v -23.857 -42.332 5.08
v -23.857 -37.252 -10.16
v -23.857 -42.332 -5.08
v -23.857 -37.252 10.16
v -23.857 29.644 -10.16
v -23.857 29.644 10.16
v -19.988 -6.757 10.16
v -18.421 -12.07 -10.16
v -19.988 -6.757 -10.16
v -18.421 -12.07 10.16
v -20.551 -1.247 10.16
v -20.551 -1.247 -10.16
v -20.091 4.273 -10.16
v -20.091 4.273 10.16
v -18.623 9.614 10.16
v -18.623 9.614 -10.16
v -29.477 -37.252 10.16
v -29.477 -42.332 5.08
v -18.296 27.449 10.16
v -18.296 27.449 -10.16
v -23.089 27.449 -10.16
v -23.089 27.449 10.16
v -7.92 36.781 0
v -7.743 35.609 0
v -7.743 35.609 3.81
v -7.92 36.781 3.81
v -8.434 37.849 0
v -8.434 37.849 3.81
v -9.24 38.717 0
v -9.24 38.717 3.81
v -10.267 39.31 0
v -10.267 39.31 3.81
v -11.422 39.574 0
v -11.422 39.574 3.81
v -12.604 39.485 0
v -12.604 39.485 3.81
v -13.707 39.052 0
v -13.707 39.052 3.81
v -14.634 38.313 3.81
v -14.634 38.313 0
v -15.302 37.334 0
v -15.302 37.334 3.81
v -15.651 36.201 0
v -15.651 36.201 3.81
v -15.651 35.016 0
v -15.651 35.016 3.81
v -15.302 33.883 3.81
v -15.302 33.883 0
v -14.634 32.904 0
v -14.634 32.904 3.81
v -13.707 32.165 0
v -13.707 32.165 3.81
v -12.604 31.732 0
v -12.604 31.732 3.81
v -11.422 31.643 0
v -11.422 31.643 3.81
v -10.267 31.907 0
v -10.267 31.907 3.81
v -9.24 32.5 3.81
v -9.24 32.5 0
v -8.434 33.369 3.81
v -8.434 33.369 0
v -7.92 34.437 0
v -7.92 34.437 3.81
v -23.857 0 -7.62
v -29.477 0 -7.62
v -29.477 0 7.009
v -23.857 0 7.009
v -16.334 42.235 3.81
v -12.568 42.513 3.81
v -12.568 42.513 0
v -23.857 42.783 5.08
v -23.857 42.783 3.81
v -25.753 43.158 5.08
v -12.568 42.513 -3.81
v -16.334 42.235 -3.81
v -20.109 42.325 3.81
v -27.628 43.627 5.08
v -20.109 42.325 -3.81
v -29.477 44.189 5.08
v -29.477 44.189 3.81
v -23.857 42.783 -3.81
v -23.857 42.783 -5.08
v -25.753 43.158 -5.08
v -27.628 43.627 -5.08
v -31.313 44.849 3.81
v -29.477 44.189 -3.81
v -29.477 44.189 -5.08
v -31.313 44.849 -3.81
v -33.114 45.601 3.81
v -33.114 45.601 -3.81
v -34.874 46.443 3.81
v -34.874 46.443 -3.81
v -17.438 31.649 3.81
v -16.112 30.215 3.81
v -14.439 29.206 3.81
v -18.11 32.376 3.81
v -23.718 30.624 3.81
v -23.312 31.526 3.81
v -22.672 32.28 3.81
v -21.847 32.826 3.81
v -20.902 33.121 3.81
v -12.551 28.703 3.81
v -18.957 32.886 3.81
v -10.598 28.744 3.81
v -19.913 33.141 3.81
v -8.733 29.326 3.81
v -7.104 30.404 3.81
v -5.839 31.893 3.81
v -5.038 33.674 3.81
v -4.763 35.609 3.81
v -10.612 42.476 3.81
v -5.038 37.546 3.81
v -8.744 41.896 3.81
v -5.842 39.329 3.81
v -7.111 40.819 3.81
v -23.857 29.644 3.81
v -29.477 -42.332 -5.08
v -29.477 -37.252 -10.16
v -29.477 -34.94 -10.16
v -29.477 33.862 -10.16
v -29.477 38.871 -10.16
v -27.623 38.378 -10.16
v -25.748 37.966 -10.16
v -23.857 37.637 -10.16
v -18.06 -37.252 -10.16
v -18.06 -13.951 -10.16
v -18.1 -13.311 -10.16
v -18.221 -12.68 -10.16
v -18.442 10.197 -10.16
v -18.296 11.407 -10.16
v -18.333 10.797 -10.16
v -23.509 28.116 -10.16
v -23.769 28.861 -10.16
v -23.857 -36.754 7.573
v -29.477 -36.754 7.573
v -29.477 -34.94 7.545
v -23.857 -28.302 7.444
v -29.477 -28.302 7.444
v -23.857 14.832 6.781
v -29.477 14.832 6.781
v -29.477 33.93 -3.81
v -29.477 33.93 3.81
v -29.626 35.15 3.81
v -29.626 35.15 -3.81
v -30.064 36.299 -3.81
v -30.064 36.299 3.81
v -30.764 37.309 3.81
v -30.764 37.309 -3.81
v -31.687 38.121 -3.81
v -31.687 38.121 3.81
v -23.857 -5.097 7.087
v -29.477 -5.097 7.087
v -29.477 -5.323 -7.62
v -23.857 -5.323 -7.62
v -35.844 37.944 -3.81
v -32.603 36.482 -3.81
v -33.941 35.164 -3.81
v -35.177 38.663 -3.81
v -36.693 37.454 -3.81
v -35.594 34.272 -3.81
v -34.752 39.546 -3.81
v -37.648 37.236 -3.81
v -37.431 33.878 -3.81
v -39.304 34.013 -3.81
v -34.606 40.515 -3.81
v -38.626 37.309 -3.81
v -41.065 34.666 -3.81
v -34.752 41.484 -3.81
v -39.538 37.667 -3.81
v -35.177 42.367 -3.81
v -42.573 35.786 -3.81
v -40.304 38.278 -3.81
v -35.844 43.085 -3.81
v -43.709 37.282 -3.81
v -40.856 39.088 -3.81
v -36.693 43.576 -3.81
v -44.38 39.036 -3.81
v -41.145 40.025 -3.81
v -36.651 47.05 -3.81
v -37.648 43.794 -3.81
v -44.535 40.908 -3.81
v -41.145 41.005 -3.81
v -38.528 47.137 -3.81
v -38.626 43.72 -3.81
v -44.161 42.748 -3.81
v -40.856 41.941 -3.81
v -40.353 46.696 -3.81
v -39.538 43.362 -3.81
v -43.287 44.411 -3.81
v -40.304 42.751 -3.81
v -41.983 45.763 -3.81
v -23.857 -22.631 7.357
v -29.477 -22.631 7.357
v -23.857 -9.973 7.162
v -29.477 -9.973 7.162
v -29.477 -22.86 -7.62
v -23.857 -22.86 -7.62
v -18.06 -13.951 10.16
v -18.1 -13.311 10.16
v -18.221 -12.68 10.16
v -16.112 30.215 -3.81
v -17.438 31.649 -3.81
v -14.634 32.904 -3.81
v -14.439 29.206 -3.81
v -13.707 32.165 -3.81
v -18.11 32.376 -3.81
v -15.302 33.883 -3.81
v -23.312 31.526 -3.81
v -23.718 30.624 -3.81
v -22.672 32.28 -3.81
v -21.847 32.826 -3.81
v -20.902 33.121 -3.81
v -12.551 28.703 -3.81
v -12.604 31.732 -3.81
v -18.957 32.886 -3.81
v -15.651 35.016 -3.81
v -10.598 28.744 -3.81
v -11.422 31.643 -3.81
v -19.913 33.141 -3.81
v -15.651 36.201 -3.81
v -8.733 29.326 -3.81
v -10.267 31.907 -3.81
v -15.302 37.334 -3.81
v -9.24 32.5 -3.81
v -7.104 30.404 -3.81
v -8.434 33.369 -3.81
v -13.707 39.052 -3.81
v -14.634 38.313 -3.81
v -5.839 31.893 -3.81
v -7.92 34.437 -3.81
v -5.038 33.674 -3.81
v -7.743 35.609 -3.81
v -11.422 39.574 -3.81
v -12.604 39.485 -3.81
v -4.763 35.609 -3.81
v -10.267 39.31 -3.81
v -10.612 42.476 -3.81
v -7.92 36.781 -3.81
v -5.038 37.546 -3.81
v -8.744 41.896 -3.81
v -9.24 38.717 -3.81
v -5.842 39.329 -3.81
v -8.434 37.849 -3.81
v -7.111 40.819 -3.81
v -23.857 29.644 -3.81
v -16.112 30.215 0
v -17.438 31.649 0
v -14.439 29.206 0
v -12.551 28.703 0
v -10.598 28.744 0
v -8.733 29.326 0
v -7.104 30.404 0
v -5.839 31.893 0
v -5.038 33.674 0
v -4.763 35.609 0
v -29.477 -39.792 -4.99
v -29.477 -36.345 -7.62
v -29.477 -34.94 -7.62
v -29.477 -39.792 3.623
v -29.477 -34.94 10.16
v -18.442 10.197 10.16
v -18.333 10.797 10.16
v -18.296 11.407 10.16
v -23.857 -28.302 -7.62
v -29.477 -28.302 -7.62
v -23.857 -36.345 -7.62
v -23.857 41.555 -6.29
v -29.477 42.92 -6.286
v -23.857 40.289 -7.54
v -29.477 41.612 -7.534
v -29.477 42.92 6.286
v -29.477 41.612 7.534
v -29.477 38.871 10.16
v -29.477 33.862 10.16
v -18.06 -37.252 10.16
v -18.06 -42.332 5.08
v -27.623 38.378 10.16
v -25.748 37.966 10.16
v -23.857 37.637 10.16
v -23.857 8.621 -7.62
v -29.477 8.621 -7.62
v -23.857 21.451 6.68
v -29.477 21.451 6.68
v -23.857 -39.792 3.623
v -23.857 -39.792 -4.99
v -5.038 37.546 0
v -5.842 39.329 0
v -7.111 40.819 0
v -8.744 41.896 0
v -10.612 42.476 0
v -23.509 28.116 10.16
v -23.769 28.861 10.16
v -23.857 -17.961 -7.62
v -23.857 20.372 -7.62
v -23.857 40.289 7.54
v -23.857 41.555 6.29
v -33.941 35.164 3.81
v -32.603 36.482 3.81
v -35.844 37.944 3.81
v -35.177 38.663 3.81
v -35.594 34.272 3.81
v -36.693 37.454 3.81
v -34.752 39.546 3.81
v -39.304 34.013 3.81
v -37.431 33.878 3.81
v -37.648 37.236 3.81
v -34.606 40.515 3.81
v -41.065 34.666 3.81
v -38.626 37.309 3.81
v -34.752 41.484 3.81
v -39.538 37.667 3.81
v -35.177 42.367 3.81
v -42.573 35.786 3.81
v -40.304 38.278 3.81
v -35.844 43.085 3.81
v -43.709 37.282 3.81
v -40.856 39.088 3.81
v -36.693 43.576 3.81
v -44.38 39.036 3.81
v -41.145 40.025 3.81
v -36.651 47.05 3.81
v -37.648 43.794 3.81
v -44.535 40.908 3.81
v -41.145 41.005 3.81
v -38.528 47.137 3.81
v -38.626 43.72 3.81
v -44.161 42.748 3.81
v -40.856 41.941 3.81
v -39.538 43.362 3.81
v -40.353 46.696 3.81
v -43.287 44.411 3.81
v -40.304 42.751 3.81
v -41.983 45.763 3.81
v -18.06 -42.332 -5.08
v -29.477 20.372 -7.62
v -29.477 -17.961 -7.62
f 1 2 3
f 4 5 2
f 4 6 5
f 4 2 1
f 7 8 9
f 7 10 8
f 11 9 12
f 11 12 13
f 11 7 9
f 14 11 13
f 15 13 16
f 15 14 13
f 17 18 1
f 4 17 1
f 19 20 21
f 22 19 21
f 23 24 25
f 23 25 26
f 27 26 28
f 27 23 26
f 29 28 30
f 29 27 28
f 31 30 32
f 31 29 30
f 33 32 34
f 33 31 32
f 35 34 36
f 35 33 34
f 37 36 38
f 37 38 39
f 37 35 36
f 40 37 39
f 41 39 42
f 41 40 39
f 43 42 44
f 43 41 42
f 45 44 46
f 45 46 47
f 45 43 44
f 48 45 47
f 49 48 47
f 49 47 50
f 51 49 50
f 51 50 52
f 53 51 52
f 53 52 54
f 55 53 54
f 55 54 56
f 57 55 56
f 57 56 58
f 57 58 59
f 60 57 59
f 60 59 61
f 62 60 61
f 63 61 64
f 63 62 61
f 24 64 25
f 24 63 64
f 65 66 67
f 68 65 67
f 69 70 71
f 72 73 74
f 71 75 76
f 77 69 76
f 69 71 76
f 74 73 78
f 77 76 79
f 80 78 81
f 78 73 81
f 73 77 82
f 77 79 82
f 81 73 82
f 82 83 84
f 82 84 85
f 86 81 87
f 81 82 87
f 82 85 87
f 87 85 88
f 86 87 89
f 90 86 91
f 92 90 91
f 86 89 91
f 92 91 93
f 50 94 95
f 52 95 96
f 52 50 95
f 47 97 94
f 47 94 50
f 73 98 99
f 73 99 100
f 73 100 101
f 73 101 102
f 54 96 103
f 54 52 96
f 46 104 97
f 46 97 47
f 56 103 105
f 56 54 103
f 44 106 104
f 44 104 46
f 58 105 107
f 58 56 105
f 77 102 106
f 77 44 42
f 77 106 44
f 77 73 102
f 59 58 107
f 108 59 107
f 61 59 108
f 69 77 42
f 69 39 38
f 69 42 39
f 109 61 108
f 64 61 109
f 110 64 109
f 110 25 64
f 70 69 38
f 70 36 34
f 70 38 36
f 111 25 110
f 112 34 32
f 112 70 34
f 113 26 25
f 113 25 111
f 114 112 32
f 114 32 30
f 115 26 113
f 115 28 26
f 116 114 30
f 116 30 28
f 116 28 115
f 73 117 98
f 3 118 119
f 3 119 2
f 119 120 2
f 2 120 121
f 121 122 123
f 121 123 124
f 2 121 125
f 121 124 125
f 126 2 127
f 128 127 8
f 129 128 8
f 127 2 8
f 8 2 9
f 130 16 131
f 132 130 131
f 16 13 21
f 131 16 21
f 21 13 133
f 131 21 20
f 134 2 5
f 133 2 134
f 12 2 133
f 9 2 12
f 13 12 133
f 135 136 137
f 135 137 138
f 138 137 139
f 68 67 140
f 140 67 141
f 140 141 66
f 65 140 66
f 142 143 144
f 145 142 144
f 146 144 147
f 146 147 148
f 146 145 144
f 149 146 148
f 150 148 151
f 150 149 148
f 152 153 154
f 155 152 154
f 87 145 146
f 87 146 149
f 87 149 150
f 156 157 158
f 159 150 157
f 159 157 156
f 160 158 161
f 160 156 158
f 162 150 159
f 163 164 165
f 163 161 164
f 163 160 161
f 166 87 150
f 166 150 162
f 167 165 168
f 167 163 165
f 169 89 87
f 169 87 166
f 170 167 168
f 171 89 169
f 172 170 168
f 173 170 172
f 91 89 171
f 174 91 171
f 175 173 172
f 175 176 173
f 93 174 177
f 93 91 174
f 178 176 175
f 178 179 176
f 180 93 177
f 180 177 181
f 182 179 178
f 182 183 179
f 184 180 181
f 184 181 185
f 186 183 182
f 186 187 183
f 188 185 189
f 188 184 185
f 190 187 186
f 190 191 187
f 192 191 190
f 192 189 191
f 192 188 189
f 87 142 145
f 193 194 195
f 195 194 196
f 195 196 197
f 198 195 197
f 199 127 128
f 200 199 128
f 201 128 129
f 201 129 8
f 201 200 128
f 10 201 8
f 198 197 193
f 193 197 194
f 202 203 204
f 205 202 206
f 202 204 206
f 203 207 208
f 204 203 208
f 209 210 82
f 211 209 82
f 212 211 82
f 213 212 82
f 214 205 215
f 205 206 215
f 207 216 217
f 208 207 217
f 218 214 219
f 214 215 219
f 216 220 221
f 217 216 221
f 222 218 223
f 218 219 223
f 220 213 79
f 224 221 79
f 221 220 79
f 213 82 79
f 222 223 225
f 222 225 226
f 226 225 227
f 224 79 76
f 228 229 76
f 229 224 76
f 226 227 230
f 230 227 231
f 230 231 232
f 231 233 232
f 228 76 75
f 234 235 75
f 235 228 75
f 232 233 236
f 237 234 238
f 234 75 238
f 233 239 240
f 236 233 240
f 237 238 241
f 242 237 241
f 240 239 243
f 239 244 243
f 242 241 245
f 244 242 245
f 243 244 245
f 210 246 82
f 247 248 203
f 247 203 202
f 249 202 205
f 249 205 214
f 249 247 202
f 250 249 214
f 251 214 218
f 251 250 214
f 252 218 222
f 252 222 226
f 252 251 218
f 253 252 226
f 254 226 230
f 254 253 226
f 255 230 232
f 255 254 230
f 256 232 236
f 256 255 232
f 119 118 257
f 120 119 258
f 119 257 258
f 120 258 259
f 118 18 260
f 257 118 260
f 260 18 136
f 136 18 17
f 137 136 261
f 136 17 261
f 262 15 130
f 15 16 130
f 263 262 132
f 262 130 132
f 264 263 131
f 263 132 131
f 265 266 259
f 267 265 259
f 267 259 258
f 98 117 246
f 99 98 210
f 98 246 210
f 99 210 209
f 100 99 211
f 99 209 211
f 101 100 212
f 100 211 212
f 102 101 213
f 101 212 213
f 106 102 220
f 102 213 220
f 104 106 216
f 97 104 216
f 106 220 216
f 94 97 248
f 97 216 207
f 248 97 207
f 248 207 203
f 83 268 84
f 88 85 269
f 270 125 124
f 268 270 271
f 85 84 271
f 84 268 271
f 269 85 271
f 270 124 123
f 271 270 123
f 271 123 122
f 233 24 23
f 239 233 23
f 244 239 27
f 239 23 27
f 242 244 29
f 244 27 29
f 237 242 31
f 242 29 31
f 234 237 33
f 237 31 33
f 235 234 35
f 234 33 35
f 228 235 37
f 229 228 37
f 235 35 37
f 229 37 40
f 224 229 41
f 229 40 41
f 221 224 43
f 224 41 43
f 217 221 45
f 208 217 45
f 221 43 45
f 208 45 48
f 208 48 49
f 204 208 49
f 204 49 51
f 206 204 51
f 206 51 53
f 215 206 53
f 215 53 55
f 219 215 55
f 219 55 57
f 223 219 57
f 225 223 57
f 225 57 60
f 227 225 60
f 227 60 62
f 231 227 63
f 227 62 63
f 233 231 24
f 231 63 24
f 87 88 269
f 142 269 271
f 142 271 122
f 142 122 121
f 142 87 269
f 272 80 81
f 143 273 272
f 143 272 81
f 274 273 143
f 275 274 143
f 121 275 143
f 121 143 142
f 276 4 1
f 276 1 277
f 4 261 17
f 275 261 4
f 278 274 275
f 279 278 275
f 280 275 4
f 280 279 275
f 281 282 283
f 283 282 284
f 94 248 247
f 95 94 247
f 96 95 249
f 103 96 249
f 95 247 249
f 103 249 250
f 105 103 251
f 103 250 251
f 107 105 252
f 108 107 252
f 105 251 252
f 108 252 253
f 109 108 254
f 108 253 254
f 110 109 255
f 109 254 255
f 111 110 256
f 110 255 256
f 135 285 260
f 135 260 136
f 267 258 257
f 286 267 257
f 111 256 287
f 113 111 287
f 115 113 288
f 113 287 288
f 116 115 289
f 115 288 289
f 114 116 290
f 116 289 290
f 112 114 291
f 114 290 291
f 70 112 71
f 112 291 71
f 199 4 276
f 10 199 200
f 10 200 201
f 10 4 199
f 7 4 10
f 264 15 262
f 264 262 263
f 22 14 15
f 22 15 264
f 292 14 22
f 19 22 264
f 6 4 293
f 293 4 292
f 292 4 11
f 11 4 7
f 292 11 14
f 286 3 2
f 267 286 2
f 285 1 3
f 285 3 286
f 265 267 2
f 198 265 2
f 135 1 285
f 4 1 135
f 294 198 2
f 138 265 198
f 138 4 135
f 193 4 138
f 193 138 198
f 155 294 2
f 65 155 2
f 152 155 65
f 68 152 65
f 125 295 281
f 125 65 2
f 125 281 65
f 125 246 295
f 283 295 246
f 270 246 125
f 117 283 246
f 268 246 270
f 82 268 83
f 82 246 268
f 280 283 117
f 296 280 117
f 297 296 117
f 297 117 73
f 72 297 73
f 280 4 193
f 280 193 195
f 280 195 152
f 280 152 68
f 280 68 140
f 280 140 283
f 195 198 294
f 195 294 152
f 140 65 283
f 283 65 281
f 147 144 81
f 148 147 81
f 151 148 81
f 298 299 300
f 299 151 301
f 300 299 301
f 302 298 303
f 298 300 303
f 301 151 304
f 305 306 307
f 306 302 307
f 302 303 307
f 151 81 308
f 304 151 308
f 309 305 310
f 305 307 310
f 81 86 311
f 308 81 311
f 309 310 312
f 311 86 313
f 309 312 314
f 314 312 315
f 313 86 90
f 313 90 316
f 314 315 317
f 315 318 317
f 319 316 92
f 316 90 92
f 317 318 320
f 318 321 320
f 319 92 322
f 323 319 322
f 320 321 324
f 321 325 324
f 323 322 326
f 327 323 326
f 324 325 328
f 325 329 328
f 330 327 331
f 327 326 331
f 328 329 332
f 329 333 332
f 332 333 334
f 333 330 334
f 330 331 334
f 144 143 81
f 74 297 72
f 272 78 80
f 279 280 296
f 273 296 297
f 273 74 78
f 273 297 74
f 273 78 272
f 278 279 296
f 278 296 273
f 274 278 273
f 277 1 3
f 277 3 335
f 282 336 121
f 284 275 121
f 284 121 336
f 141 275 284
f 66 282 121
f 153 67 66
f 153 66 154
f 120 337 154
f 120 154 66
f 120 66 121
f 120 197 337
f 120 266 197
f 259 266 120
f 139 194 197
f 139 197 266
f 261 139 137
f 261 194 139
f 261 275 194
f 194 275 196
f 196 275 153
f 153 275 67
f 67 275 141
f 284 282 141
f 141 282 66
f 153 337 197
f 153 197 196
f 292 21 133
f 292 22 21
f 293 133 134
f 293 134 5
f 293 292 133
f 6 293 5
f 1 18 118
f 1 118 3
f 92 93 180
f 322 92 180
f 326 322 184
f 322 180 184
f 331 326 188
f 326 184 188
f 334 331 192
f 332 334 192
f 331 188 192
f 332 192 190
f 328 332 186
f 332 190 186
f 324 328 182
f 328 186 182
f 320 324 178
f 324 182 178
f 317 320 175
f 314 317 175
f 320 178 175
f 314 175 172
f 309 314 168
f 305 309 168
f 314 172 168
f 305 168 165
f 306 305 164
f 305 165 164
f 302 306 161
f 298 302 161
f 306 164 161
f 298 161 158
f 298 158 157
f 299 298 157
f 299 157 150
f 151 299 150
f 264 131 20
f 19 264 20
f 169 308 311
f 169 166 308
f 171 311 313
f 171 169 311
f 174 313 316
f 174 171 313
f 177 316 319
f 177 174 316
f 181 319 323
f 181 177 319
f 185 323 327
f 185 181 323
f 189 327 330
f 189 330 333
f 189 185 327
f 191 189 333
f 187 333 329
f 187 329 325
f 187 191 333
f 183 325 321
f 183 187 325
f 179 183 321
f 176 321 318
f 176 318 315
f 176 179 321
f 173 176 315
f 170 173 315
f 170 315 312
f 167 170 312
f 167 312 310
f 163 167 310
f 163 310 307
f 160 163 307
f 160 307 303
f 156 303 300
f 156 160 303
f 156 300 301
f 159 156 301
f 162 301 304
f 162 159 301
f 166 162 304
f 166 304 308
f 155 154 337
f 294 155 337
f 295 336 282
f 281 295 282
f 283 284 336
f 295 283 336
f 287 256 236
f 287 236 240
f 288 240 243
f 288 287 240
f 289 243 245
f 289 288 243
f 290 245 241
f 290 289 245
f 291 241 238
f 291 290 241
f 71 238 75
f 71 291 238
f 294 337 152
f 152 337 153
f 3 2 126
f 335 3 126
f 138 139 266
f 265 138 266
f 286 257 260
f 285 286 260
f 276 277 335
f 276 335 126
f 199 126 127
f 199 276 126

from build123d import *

# Parameters (mm, degrees)
F0_W        = 5.6202424753
F0_H        = 7.3923990308
F1_DEPTH    = 10.16
F0_R        = 3.2880029728
F0_R_2      = 3.9763748147
F2_DEPTH    = 3.81
F3_SIZE     = 5.08
F4_DEPTH    = 10.16
F5_SIZE     = 5.08
F6_T1_DEPTH = 7.62
F6_2_F1_R   = 5.08
F6_2_F2_R   = 5.08
F8_DEPTH    = 12.7


# Not quite as in the source:
# - a fillet or chamfer that OpenCascade refuses, or shapes differently, is made with other operations: its cross-section is extruded or revolved along the edge and cut away or added


with BuildPart() as f1:
    # F0 (on Top) → F1 (new body, symmetric)
    with BuildSketch(Plane.XY):
        Polygon((-23.8571265649, 38.1211079657), (-29.4773678438, 38.1211079657), (-29.4773678438, 33.8620854561), (-29.4773689242, -34.9397621871), (-23.8571265649, -34.9397622754), (-23.8571265649, 29.6442432214), align=None)
        with BuildLine():
            ThreePointArc((-23.8571265649, 42.7830699379), (-26.6935732854, 43.3808072311), (-29.4773678438, 44.1890199055))
            Line((-29.4773678438, 44.1890199055), (-29.4773678438, 38.1211079657))
            Line((-29.4773678438, 38.1211079657), (-23.8571265649, 38.1211079657))
            Line((-23.8571265649, 38.1211079657), (-23.8571265649, 42.7830699379))
        make_face()
        with Locations((-26.6672478026, -38.6359617025)):
            Rectangle(F0_W, F0_H)
    extrude(amount=F1_DEPTH, both=True)

    # F0 (on Top) → F2 (join, symmetric)
    with BuildSketch(Plane.XY):
        with BuildLine():
            ThreePointArc((-31.6869179481, 38.1211079657), (-31.3536995737, 39.297400699), (-31.2413621678, 40.5148075278))
            ThreePointArc((-31.2413621678, 40.5148075278), (-32.2218622797, 43.9910999495), (-34.8743439371, 46.4426974955))
            ThreePointArc((-34.8743439371, 46.4426974955), (-44.1066653776, 38.1351969368), (-31.6869179481, 38.1211079657))
        make_face()
        with Locations((-37.8940842395, 40.5148075278)):
            Circle(F0_R, mode=Mode.SUBTRACT)
        with BuildLine():
            ThreePointArc((-4.763312552, 35.6086244195), (-7.1105593997, 40.8187113422), (-12.5681646531, 42.5125585623))
            ThreePointArc((-12.5681646531, 42.5125585623), (-18.0664915689, 38.4542200705), (-17.4383845866, 31.6492812901))
            ThreePointArc((-17.4383845866, 31.6492812901), (-9.6452347995, 28.9690866137), (-4.763312552, 35.6086244195))
        make_face()
        with Locations((-11.7192433987, 35.6086244195)):
            Circle(F0_R_2, mode=Mode.SUBTRACT)
        with BuildLine():
            ThreePointArc((-12.5681646531, 42.5125585623), (-18.2225576344, 42.2341662967), (-23.8571265649, 42.7830699379))
            Line((-23.8571265649, 42.7830699379), (-23.8571265649, 38.1211079657))
            Line((-23.8571265649, 38.1211079657), (-23.8571265649, 29.6442432214))
            ThreePointArc((-23.8571265649, 29.6442432214), (-21.3848882076, 33.0065499535), (-17.4383845866, 31.6492812901))
            ThreePointArc((-17.4383845866, 31.6492812901), (-18.0664915689, 38.4542200705), (-12.5681646531, 42.5125585623))
        make_face()
        with BuildLine():
            ThreePointArc((-34.8743439371, 46.4426974955), (-32.2218622797, 43.9910999495), (-31.2413621678, 40.5148075278))
            ThreePointArc((-31.2413621678, 40.5148075278), (-31.3536995737, 39.297400699), (-31.6869179481, 38.1211079657))
            Line((-31.6869179481, 38.1211079657), (-29.4773678438, 38.1211079657))
            Line((-29.4773678438, 38.1211079657), (-29.4773678438, 44.1890199055))
            ThreePointArc((-29.4773678438, 44.1890199055), (-32.2184586739, 45.213836031), (-34.8743439371, 46.4426974955))
        make_face()
    extrude(amount=F2_DEPTH, both=True)

    # F3
    f3_edges = [f1.edges().sort_by_distance(p)[0] for p in [
        (-26.693573, 43.380807, 10.16),
        (-26.693573, 43.380807, -10.16),
        (-26.667248, -42.332161, 10.16),
        (-26.667248, -42.332161, -10.16),
    ]]
    chamfer(f3_edges, length=F3_SIZE)

    # F6: fillet of radius 5.08 on 4 edges, made by hand

    # F6_s2 → F6_t1 (join)
    with BuildSketch(Plane.XY.offset(-3.81)):
        with BuildLine():
            ThreePointArc((-29.4773678427, 33.9298172252), (-30.063578473, 36.2988375878), (-31.6869179481, 38.1211079657))
            Line((-31.6869179481, 38.1211079657), (-31.3998729586, 38.5402370318))
            ThreePointArc((-31.3998729586, 38.5402370318), (-30.5821428959, 38.6291079657), (-29.4773678438, 38.6291079657))
            Line((-29.4773678438, 38.6291079657), (-28.9693678438, 38.1211079657))
            Line((-28.9693678438, 38.1211079657), (-28.9693678427, 33.9298172173))
            Line((-28.9693678427, 33.9298172173), (-29.4773678427, 33.9298172252))
        make_face()
    extrude(amount=F6_T1_DEPTH)

    # F7 (on face) → F8 (cut)
    with BuildSketch(Plane(origin=(-29.4773683755, 4.629e-07, 0), x_dir=(-1.57e-08, -1, 0), z_dir=(-1, 1.57e-08, 0))):
        Polygon((36.3451056182, -7.62), (39.7921616808, -4.9903579056), (39.7921616808, 3.623371711), (36.7539399008, 7.5733514423), (28.3016198795, 7.443575354), (28.3016198795, -7.62), align=None)
        Polygon((9.9728746732, 7.1621576072), (22.8604692966, -7.62), (22.6305215634, 7.3565018696), align=None)
        Polygon((17.961487174, -7.62), (5.0967486238, 7.0872900485), (5.3225629052, -7.62), align=None)
        Polygon((0, -7.62), (0, 7.0090350727), (-14.8322781086, 6.7813017369), align=None)
        Polygon((-21.4508656455, 6.6796805964), (-20.3723220551, -7.62), (-8.6206179077, -7.62), align=None)
    extrude(amount=-F8_DEPTH, mode=Mode.SUBTRACT)


with BuildPart() as f4:
    # F0 (on Top) → F4 (new body, symmetric)
    with BuildSketch(Plane.XY):
        with BuildLine():
            ThreePointArc((-23.0891581237, 27.4486547619), (-23.6595960638, 28.481231591), (-23.8571265649, 29.6442432214))
            Line((-23.8571265649, 29.6442432214), (-23.8571265649, -34.9397622754))
            Line((-23.8571265649, -34.9397622754), (-23.8571265649, -42.3321612179))
            Line((-23.8571265649, -42.3321612179), (-18.0597770959, -42.3321612179))
            Line((-18.0597770959, -42.3321612179), (-18.0597770959, -12.9362130538))
            ThreePointArc((-18.0597770959, -12.9362130538), (-20.5510916383, -1.2707557569), (-18.2962100953, 10.442700237))
            Line((-18.2962100953, 10.442700237), (-18.2962100953, 27.4486547619))
            Line((-18.2962100953, 27.4486547619), (-23.0891581237, 27.4486547619))
        make_face()
    extrude(amount=F4_DEPTH, both=True)

    # F5
    f5_edges = [f4.edges().sort_by_distance(p)[0] for p in [
        (-20.958452, -42.332161, 10.16),
        (-20.958452, -42.332161, -10.16),
    ]]
    chamfer(f5_edges, length=F5_SIZE)

    # F6#2: fillet of radius 5.08 on 2 edges, made by hand

    # F6_2_f1
    f6_2_f1_edges = [f4.edges().sort_by_distance(p)[0] for p in [
        (-18.0597770959, -12.9362130538, 0),
    ]]
    fillet(f6_2_f1_edges, radius=F6_2_F1_R)

    # F6_2_f2
    f6_2_f2_edges = [f4.edges().sort_by_distance(p)[0] for p in [
        (-18.2962100953, 10.442700237, 0),
    ]]
    fillet(f6_2_f2_edges, radius=F6_2_F2_R)


solid = Compound([f1.part, f4.part])
